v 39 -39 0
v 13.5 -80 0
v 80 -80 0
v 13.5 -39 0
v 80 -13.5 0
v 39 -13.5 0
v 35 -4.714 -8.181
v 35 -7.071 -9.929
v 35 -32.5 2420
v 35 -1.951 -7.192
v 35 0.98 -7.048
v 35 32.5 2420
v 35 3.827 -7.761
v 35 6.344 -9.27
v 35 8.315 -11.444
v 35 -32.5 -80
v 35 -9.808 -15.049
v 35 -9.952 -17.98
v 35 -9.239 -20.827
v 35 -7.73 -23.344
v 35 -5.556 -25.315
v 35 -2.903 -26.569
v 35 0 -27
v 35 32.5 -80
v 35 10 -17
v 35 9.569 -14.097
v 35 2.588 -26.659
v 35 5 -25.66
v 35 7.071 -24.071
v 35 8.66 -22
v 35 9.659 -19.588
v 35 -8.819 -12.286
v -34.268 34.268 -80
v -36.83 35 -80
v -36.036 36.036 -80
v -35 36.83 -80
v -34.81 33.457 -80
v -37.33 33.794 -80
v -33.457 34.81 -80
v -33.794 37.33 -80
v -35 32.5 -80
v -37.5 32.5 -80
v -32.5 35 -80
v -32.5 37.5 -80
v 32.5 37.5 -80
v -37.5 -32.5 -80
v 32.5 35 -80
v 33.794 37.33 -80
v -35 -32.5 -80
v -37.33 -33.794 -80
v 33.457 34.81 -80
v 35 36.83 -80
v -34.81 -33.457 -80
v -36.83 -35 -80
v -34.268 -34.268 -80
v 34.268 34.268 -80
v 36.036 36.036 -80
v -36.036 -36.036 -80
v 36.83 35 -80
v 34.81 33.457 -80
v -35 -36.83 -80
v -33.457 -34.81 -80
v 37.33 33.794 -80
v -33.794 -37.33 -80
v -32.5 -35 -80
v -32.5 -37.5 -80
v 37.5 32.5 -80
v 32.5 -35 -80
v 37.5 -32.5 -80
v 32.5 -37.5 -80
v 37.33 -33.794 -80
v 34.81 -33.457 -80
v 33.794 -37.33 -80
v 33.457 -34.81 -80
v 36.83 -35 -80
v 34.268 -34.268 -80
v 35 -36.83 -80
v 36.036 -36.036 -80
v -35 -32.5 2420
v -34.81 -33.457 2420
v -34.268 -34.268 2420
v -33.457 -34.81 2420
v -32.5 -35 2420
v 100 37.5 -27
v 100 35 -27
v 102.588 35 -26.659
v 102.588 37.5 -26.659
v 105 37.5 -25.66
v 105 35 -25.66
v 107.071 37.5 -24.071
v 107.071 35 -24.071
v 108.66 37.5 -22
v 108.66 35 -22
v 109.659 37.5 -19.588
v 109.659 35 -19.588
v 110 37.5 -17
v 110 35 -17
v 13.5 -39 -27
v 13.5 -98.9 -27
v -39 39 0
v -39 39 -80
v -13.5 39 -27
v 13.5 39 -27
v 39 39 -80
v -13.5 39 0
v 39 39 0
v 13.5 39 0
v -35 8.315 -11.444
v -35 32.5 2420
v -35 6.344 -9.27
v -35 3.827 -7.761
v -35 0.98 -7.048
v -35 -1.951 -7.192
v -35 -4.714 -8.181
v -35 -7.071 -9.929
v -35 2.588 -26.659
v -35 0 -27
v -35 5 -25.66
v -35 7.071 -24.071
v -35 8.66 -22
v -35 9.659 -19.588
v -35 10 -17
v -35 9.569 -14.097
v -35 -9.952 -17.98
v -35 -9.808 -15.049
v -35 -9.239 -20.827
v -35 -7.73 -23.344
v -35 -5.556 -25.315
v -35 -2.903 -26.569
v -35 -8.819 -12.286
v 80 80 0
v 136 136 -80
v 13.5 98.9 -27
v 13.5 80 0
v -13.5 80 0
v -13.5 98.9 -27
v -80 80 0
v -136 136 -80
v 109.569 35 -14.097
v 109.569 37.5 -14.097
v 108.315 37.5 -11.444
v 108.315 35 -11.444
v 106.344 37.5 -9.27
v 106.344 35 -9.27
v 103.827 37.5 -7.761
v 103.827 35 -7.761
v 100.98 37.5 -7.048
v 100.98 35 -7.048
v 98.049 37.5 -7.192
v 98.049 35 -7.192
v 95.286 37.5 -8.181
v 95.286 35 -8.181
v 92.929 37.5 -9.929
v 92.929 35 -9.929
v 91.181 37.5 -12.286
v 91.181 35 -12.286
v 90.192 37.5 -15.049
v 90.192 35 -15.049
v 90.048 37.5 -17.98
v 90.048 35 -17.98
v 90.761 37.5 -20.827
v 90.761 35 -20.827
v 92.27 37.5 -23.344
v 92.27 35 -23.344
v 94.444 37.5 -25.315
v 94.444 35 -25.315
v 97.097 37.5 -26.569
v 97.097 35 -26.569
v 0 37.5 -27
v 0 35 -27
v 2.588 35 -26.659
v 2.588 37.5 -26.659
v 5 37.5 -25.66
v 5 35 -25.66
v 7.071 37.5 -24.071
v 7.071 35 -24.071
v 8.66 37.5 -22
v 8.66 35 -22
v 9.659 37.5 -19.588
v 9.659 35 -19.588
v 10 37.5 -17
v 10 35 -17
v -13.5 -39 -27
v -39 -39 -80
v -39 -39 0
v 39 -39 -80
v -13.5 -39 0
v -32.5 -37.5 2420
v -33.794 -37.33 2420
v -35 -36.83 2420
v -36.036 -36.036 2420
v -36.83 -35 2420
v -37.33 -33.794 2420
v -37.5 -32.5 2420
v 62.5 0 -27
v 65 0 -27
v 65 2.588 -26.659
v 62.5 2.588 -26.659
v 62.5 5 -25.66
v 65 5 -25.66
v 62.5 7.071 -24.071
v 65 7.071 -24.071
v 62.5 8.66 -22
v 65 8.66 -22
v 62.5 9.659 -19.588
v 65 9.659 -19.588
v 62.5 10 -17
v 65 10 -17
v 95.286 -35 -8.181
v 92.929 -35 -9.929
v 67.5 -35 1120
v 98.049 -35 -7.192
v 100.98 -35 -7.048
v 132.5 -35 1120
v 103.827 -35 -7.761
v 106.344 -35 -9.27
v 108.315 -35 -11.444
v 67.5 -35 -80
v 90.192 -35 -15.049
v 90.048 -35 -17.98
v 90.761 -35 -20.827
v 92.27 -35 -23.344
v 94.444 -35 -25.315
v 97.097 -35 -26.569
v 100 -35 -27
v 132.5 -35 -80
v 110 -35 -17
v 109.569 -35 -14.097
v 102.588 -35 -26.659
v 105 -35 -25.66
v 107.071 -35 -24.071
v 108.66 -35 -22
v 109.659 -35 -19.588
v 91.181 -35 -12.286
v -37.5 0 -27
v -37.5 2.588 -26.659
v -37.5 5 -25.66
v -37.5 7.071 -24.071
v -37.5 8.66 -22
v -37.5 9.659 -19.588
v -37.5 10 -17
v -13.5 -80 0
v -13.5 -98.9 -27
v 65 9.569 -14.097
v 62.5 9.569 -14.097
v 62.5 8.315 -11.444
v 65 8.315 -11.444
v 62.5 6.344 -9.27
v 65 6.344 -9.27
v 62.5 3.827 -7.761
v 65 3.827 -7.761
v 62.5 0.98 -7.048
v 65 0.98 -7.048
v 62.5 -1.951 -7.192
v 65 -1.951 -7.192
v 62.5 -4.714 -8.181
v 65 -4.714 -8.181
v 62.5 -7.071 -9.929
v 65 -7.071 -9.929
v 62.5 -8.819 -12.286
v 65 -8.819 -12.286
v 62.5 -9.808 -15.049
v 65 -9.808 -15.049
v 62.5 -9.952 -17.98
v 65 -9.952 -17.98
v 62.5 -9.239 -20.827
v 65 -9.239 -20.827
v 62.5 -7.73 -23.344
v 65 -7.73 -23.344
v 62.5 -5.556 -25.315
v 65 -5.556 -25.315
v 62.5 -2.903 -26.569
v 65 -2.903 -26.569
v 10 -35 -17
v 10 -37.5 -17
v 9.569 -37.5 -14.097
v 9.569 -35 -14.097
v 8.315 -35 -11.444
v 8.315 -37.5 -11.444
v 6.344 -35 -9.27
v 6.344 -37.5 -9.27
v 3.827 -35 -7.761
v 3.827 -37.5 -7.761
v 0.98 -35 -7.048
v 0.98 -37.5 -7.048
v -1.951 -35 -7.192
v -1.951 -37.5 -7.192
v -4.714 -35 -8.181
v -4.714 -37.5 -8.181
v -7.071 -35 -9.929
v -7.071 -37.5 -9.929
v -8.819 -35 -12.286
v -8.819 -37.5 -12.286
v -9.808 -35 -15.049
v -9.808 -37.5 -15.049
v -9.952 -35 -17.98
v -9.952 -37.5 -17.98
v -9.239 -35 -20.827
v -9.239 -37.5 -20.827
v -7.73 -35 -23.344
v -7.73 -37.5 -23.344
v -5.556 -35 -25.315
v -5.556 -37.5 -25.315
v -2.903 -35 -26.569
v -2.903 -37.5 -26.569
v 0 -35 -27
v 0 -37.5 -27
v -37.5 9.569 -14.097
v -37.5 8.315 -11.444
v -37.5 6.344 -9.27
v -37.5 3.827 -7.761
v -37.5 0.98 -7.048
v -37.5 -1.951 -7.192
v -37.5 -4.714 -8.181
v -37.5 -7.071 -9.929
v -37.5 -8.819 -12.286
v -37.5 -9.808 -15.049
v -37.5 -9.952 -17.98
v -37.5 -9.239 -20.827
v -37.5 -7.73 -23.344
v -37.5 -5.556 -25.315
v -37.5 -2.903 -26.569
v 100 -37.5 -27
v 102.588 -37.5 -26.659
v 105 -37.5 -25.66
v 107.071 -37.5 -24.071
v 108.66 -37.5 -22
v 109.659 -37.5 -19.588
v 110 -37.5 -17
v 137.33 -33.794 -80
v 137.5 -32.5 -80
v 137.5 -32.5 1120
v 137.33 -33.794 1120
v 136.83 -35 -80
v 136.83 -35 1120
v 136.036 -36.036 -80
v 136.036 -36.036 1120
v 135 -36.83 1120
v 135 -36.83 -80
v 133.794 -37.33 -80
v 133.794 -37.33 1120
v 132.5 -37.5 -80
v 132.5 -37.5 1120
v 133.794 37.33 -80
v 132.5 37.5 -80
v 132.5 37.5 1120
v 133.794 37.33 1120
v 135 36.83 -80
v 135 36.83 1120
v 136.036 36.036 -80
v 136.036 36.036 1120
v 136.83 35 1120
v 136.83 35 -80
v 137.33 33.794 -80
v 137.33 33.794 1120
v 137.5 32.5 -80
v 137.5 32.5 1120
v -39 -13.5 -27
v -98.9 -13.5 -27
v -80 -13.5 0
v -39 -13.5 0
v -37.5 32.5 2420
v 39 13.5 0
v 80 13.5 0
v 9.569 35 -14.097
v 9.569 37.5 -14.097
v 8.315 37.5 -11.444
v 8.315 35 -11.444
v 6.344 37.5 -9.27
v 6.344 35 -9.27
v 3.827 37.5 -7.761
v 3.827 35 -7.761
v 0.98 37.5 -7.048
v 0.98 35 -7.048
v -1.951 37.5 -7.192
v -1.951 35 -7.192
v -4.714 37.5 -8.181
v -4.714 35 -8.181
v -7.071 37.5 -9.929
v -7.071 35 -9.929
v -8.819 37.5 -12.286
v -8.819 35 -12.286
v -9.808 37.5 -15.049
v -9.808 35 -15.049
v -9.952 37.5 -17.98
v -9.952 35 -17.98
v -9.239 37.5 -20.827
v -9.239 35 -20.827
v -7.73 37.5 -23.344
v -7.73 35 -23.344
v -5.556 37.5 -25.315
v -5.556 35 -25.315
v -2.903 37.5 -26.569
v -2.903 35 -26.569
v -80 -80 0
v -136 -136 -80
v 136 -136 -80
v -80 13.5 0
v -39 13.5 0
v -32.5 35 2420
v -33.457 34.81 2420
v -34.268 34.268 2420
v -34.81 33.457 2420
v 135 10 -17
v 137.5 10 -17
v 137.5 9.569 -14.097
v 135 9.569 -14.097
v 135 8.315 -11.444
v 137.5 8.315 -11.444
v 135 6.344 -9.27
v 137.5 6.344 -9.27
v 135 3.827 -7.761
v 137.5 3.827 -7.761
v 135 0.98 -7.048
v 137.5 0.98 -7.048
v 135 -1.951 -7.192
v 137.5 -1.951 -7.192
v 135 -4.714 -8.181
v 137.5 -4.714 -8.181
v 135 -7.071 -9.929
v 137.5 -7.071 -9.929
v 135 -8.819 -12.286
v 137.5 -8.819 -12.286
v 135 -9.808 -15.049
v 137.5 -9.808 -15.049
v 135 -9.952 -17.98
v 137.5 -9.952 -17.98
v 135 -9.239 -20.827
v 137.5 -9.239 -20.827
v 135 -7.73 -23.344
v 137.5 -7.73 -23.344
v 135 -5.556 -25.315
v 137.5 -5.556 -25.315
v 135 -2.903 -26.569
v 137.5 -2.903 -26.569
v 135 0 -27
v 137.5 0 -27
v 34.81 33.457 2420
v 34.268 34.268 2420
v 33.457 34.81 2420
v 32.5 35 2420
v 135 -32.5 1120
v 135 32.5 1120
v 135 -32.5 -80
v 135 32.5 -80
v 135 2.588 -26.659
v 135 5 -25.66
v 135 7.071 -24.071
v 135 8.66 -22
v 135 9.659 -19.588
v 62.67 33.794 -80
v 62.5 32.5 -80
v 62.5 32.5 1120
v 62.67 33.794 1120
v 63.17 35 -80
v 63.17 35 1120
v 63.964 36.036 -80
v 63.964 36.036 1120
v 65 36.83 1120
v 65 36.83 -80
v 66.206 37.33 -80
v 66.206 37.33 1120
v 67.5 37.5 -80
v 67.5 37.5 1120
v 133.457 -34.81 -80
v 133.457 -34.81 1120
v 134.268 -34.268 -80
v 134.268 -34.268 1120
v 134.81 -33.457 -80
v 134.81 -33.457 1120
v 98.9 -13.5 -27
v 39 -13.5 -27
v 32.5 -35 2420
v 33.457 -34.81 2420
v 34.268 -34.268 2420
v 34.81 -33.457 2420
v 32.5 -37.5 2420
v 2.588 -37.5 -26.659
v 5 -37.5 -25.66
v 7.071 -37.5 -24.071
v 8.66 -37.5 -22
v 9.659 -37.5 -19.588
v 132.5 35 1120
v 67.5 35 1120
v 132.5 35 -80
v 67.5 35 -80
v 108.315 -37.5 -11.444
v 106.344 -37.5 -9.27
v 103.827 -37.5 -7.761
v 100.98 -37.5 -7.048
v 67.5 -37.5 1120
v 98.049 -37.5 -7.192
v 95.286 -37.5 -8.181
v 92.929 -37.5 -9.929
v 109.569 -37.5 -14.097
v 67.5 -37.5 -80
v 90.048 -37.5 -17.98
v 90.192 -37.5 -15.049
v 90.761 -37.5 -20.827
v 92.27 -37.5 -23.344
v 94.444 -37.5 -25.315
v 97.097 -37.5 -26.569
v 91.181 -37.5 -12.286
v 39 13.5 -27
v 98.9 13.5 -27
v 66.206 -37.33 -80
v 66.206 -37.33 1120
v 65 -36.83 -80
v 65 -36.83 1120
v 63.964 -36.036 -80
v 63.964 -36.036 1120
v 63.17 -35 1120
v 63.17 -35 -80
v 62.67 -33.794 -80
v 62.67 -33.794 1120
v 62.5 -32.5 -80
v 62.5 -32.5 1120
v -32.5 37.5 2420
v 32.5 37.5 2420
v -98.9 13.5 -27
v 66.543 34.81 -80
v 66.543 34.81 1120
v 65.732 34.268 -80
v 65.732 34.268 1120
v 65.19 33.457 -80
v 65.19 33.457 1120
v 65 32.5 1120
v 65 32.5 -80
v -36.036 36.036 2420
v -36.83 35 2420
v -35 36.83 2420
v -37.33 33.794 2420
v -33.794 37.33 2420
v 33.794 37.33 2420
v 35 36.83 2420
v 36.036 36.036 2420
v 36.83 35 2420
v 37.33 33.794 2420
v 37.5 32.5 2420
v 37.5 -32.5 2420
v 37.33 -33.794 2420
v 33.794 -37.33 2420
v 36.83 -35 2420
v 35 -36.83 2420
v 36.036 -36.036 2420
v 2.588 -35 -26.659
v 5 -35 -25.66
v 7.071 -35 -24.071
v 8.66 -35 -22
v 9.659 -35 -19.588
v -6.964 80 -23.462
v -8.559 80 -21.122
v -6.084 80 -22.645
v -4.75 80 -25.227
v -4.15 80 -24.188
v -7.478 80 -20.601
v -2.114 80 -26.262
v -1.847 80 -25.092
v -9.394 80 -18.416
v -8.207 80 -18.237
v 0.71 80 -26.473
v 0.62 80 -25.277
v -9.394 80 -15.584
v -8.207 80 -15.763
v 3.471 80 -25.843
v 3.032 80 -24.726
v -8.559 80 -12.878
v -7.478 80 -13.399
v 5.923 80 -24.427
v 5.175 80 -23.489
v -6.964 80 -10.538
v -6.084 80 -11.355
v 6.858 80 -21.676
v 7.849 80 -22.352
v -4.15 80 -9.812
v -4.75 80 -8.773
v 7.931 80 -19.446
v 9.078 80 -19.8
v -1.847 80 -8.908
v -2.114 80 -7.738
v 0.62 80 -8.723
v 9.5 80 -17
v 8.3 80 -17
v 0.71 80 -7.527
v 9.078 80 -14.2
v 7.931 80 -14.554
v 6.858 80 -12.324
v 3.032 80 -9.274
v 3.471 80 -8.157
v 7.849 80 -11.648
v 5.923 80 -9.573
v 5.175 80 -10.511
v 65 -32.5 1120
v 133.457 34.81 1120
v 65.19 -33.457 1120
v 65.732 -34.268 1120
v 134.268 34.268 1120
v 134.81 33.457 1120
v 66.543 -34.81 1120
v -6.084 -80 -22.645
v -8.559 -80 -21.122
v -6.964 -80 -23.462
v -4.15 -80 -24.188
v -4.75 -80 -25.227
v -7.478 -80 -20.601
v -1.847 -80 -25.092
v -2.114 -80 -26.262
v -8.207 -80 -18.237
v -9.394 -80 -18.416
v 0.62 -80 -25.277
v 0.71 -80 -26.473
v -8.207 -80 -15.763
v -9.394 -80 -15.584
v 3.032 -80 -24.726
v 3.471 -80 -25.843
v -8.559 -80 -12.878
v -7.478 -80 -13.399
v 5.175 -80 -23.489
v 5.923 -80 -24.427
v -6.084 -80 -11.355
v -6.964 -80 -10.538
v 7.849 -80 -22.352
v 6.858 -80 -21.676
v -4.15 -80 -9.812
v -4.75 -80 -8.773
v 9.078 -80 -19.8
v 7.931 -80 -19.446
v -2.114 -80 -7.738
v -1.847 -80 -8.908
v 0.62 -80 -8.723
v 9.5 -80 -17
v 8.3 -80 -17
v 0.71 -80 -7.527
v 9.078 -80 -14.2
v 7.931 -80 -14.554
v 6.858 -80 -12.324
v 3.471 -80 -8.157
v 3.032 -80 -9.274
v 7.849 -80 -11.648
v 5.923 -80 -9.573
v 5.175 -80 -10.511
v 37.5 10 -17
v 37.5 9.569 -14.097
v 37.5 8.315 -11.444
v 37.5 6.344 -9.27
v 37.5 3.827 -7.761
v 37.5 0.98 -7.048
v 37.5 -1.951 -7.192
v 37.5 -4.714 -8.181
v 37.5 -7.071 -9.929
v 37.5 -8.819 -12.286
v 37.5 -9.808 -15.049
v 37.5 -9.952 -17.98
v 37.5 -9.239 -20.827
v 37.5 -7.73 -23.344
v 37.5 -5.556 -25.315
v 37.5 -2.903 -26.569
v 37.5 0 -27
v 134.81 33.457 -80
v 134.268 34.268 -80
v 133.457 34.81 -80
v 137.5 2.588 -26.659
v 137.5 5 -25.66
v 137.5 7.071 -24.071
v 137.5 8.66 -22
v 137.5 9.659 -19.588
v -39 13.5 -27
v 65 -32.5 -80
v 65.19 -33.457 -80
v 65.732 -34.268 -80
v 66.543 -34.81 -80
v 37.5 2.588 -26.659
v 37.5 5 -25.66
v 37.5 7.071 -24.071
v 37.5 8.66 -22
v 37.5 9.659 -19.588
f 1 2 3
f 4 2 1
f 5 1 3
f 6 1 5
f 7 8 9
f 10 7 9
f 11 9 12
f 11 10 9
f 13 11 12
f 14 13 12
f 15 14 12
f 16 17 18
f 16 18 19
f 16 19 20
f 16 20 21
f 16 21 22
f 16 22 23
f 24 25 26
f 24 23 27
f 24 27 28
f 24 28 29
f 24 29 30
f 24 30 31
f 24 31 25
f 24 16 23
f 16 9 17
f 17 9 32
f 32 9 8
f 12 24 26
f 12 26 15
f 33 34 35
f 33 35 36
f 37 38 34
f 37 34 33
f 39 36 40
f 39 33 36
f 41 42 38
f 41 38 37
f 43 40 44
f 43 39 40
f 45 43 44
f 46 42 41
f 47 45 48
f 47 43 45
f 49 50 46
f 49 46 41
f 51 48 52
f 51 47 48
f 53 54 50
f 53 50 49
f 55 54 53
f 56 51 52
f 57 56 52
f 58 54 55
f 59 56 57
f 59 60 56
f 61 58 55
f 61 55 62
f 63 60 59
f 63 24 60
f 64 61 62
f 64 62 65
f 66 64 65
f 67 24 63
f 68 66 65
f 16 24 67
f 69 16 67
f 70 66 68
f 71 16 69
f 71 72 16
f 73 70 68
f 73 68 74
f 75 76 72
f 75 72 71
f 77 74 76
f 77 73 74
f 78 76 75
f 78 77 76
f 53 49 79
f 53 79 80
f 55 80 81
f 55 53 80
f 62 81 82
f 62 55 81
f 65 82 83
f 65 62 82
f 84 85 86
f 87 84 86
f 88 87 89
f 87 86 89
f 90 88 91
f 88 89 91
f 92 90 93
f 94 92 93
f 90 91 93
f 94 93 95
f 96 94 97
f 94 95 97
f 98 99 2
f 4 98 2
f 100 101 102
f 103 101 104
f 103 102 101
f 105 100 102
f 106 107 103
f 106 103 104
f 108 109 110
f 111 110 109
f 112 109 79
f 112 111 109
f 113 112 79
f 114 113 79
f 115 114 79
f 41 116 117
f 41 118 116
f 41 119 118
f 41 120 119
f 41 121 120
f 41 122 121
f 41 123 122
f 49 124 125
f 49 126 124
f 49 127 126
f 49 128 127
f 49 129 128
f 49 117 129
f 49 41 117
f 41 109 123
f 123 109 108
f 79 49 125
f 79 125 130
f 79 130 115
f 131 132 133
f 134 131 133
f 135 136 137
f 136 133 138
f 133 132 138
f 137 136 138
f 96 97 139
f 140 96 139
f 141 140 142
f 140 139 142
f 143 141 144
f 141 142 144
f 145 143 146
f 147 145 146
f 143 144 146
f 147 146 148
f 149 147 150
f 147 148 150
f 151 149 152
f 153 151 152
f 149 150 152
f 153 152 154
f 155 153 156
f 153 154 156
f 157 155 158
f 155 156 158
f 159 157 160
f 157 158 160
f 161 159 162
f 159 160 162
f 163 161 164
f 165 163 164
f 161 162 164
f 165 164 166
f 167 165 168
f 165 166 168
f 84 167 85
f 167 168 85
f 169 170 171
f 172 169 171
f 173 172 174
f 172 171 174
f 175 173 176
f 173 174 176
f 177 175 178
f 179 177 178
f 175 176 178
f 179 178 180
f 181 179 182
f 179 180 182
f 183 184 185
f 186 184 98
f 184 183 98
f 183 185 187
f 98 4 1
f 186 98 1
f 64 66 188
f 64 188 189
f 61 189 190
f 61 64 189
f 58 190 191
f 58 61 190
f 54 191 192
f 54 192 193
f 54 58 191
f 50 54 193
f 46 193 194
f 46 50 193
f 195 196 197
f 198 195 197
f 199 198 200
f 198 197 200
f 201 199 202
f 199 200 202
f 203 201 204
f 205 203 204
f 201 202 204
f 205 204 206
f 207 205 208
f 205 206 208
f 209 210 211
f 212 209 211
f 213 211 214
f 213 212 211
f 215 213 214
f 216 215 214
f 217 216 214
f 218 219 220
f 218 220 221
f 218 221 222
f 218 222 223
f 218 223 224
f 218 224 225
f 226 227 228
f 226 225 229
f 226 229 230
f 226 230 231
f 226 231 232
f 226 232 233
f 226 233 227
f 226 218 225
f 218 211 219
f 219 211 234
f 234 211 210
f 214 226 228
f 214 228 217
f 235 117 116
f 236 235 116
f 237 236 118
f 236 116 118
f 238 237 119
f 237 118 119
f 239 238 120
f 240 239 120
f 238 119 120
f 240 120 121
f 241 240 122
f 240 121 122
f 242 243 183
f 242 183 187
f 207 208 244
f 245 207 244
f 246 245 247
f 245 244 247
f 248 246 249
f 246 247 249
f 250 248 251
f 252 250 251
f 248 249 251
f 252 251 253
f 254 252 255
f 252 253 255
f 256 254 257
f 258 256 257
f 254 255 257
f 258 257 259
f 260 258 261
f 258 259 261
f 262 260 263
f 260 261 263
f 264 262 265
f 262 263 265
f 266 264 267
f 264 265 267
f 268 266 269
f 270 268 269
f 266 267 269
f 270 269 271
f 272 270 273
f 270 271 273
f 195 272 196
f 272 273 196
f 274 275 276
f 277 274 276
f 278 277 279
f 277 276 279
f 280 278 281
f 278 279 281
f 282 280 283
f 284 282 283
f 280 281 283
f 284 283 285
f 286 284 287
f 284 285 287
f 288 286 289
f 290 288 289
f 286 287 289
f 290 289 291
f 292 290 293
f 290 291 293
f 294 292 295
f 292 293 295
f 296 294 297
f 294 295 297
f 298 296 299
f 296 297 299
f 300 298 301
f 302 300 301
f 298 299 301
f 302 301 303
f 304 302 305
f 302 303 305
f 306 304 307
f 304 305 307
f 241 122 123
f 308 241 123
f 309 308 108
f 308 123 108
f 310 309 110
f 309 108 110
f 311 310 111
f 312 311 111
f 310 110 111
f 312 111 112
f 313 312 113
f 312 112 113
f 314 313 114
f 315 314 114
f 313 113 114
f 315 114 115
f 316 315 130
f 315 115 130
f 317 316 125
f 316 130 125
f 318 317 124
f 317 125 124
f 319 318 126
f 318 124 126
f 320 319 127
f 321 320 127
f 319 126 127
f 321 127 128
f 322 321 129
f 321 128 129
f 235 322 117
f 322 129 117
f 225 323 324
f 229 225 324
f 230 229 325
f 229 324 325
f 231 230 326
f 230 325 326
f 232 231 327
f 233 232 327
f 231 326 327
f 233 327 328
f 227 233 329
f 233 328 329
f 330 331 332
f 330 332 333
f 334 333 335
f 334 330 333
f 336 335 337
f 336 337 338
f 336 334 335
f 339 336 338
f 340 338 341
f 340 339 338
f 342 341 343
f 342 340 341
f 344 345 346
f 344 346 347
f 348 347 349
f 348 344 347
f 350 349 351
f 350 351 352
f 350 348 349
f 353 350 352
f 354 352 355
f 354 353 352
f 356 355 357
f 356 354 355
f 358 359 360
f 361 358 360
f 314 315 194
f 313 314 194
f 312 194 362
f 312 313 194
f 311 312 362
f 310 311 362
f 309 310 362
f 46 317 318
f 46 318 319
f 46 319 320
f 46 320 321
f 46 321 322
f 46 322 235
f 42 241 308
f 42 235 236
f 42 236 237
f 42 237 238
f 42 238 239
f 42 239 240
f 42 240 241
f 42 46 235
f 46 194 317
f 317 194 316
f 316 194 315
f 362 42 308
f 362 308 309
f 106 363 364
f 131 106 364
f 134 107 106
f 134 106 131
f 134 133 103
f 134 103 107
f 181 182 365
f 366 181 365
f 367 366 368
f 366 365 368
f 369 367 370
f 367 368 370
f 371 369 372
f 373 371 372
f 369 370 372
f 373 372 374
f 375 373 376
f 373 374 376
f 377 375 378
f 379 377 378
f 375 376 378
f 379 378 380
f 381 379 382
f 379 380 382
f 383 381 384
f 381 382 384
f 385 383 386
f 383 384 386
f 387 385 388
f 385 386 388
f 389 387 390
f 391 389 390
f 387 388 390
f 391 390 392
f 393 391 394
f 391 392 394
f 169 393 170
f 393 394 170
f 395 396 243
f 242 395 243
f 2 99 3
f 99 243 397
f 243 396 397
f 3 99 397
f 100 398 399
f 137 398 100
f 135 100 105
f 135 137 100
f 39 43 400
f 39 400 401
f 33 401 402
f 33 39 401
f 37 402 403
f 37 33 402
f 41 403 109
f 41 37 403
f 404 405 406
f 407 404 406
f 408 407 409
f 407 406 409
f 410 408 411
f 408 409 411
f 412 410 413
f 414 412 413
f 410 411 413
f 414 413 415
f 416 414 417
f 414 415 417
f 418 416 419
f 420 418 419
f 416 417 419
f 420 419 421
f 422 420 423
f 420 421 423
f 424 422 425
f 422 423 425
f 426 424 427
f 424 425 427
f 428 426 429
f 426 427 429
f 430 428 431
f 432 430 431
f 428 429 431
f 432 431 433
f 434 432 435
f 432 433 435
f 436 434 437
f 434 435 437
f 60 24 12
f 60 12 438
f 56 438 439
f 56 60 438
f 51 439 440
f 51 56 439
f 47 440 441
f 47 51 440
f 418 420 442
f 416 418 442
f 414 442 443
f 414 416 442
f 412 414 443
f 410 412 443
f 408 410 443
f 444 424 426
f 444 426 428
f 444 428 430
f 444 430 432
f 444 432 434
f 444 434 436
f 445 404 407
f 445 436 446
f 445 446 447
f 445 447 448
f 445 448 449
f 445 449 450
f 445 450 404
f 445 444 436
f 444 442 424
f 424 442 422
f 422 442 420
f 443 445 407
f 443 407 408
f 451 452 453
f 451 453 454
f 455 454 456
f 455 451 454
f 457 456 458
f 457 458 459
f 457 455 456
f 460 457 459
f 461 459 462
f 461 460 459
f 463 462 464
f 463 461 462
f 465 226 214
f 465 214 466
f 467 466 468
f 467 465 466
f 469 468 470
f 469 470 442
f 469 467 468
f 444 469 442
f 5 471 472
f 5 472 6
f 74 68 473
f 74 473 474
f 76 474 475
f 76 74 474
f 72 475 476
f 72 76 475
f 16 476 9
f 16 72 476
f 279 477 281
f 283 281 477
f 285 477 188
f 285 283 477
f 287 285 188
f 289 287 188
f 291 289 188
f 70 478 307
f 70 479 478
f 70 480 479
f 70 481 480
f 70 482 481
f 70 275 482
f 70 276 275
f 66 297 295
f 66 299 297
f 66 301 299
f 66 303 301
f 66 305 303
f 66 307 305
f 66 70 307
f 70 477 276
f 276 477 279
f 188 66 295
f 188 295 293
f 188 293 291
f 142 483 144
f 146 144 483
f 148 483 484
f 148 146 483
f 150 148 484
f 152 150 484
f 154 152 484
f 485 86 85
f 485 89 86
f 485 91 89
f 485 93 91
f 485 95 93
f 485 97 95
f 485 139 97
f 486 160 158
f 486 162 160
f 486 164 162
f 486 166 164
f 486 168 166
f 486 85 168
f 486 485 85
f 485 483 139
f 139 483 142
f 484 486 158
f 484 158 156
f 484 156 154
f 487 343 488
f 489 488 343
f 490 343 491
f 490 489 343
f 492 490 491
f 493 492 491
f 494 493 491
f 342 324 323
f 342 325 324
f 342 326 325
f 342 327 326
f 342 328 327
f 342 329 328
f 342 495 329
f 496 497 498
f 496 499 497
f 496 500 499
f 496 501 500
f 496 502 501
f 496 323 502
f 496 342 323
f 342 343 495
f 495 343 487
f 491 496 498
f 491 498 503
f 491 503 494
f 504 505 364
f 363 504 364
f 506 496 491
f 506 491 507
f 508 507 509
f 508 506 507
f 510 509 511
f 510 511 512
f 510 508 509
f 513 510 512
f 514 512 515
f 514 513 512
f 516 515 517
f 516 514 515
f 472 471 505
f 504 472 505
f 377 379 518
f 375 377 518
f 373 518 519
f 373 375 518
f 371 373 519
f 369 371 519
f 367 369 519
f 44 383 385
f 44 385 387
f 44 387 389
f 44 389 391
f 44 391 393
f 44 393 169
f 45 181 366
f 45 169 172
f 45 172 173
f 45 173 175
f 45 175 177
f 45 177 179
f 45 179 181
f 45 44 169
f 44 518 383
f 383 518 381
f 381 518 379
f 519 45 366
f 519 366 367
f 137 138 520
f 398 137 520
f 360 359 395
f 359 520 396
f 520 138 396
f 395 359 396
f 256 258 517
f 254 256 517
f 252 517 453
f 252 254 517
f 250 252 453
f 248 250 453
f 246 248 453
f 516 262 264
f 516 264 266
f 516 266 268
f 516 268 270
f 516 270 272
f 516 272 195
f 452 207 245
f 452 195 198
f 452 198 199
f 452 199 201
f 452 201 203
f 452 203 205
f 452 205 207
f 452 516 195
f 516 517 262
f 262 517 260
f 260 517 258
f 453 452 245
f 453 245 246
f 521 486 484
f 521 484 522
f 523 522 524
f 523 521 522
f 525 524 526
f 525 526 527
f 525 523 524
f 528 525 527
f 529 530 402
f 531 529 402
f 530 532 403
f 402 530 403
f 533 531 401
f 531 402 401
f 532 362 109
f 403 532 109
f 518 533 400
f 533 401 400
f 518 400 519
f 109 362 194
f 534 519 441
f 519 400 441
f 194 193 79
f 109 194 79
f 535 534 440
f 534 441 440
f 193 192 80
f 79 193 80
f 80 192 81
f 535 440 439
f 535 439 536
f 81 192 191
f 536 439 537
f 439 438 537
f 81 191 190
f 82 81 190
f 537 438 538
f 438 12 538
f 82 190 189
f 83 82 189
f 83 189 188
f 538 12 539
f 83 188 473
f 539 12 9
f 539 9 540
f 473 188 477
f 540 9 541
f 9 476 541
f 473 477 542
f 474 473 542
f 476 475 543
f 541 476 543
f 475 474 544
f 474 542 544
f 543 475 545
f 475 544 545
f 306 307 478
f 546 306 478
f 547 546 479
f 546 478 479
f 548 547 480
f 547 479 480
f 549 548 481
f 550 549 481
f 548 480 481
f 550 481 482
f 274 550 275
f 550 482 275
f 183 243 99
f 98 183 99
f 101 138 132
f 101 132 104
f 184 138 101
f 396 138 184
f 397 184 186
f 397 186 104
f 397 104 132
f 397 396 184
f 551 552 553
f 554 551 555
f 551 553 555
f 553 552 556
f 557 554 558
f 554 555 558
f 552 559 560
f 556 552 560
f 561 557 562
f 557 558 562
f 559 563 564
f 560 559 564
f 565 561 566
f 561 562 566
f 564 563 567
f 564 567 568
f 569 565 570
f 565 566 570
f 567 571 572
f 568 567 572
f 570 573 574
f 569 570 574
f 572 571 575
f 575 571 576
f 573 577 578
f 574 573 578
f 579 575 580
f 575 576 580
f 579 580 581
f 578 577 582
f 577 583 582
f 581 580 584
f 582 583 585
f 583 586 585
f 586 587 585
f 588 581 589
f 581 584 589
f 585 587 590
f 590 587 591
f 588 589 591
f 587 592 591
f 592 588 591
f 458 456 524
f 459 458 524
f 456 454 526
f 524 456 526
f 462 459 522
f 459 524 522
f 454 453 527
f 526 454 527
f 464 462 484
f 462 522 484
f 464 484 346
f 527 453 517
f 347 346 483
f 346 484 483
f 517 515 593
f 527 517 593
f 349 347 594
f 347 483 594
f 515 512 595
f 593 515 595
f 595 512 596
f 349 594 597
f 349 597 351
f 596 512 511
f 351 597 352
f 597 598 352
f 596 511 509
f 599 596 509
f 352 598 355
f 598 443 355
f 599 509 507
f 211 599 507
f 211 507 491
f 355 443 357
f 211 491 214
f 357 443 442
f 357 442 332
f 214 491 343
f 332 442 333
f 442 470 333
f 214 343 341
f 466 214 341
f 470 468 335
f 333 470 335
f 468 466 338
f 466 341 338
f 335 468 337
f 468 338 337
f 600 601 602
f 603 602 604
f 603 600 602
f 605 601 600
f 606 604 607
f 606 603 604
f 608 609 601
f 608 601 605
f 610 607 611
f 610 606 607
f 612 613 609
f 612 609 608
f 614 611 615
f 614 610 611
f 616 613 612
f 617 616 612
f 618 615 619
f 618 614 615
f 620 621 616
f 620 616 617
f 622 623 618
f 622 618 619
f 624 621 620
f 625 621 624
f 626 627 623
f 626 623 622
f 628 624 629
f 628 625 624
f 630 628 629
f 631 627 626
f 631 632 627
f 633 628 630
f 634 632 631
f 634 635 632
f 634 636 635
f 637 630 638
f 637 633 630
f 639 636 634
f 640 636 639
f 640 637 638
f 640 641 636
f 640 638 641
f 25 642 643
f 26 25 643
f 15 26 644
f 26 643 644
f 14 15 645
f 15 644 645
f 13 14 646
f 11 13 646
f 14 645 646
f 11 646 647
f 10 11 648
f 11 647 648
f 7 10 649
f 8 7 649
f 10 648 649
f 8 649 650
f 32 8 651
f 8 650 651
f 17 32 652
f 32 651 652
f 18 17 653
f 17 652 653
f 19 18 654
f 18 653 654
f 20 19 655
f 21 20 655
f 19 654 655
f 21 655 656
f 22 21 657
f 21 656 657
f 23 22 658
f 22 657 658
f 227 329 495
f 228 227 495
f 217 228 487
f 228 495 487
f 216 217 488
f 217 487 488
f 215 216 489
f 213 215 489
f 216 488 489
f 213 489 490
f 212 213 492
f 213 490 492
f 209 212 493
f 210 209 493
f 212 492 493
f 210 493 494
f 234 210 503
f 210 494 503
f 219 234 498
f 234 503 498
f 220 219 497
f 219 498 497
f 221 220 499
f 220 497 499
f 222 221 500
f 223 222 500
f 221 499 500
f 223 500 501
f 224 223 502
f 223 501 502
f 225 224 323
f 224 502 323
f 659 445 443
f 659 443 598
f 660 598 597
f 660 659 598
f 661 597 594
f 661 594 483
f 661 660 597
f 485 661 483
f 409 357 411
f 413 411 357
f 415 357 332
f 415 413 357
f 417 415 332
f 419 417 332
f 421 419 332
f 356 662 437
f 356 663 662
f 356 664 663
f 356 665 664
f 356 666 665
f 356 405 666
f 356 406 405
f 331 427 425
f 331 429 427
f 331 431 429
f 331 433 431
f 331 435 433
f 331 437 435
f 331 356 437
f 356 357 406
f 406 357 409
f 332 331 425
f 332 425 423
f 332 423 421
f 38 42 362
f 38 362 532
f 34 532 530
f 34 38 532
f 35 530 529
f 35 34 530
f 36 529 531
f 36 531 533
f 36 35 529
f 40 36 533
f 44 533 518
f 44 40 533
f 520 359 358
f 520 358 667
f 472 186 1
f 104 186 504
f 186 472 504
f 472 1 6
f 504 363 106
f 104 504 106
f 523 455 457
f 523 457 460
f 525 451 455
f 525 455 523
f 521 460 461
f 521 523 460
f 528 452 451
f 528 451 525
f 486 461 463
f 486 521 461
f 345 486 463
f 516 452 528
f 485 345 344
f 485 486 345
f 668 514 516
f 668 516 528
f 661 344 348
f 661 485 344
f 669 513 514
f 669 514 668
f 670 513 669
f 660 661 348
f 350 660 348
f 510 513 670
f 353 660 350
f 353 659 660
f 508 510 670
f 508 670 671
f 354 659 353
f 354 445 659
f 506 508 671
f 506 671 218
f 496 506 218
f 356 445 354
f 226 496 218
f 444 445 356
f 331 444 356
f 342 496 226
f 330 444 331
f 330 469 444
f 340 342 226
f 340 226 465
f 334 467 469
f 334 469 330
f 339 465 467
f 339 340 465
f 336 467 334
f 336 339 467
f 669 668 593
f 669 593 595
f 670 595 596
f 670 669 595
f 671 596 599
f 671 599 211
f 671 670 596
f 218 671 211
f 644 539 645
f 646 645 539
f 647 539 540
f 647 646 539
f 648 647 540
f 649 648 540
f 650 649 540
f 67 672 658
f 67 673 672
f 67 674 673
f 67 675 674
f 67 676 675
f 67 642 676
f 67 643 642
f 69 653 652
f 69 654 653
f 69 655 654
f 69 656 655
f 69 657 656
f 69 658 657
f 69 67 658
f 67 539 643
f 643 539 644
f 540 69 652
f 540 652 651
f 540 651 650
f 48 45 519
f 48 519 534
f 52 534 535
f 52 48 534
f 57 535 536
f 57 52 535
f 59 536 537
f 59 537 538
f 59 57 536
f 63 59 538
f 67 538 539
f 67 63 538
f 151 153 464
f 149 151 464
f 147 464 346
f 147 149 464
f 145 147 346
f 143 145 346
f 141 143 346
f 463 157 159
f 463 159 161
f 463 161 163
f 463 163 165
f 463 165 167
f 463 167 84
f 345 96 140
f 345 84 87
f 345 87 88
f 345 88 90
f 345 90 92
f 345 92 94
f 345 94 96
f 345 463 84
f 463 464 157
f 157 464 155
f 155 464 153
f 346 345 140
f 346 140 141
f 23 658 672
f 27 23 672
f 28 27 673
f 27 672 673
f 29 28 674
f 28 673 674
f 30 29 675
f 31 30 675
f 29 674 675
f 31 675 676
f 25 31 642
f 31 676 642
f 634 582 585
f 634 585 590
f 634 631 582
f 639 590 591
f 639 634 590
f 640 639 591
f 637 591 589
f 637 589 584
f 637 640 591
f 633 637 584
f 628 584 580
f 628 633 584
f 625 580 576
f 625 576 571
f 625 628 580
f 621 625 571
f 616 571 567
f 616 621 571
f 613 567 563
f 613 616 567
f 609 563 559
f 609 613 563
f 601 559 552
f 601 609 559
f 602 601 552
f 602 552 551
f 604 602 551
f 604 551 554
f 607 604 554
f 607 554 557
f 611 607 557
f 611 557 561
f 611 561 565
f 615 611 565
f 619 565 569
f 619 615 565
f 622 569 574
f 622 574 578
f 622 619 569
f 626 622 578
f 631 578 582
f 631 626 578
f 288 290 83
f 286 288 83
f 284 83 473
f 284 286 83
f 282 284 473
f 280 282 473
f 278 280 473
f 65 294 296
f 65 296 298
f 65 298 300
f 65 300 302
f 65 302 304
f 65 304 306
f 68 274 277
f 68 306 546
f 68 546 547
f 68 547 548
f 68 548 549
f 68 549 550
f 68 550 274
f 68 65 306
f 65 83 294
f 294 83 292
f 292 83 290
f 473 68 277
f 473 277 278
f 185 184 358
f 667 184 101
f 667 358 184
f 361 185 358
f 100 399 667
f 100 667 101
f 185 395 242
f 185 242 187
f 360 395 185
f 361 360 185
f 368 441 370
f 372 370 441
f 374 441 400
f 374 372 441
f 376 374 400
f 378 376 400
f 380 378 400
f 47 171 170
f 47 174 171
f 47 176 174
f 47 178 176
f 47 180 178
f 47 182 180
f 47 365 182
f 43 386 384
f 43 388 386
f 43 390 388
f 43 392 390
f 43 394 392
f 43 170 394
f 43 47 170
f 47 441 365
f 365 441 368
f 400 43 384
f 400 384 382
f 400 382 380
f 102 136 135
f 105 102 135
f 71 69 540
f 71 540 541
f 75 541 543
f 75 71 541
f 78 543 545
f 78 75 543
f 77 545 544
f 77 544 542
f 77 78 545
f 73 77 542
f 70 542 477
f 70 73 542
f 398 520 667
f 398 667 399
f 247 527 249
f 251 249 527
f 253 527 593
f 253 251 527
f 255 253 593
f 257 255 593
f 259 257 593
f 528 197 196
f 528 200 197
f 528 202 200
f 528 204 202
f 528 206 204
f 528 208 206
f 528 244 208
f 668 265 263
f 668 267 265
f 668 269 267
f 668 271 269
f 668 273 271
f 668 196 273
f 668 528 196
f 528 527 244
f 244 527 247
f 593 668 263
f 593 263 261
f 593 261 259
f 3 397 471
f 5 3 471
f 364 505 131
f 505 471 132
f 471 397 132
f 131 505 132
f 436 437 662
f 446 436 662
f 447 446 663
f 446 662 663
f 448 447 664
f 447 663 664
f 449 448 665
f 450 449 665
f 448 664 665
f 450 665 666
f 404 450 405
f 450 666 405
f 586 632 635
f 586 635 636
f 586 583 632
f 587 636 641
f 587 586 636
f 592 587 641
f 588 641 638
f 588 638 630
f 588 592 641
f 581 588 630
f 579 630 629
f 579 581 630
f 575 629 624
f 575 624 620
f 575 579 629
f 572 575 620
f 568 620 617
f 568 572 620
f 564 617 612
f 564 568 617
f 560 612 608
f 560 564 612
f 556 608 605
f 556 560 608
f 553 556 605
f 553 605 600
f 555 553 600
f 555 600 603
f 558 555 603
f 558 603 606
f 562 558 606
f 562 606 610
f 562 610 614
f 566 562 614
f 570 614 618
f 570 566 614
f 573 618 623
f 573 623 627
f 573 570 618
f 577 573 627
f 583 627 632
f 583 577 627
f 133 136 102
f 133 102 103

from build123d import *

# Parameters (mm, degrees)
F0_W      = 160
F0_H      = 160
F3_W      = 272
F3_H      = 272
F5_W      = 78
F5_H      = 78
F6_DEPTH  = 80.0010001
F7_W      = 27
F7_H      = 54
F8_DEPTH  = 119.1
F9_W      = 27
F9_H      = 54
F10_DEPTH = 400
F12_DEPTH = 2500
F14_DEPTH = 173.5010001
F16_DEPTH = 173.5010001
F17_R     = 9.5
F17_R_2   = 8.3
F18_DEPTH = 80
F20_DEPTH = 1300


with BuildPart() as f4:
    # F0 (on Top) → F4 section 0
    with BuildSketch(Plane.XY):
        Rectangle(F0_W, F0_H)
    # F3 (on line) → F4 section 1
    with BuildSketch(Plane(origin=(0, 0, -80), x_dir=(1, 0, 0), z_dir=(0, 0, -1))):
        Rectangle(F3_W, F3_H)
    loft()

    # F5 (on face) → F6 (cut, through all)
    with BuildSketch(Plane.XY):
        Rectangle(F5_W, F5_H)
    extrude(amount=-F6_DEPTH, mode=Mode.SUBTRACT)

    # F7 (on Front) → F8 (cut, symmetric)
    with BuildSketch(Plane.XZ):
        Rectangle(F7_W, F7_H)
    extrude(amount=F8_DEPTH, both=True, mode=Mode.SUBTRACT)

    # F9 (on Right) → F10 (cut, symmetric)
    with BuildSketch(Plane.YZ):
        Rectangle(F9_W, F9_H)
    extrude(amount=F10_DEPTH, both=True, mode=Mode.SUBTRACT)


with BuildPart() as f12:
    # F11 (on line) → F12 (new body)
    with BuildSketch(Plane(origin=(0, 0, -80), x_dir=(1, 0, 0), z_dir=(0, 0, -1))):
        with BuildLine():
            Line((32.5, 37.5), (-32.5, 37.5))
            ThreePointArc((-32.5, 37.5), (-36.0355339059, 36.0355339059), (-37.5, 32.5))
            Line((-37.5, 32.5), (-37.5, -32.5))
            ThreePointArc((-37.5, -32.5), (-36.0355339059, -36.0355339059), (-32.5, -37.5))
            Line((-32.5, -37.5), (32.5, -37.5))
            ThreePointArc((32.5, -37.5), (36.0355339059, -36.0355339059), (37.5, -32.5))
            Line((37.5, -32.5), (37.5, 32.5))
            ThreePointArc((37.5, 32.5), (36.0355339059, 36.0355339059), (32.5, 37.5))
        make_face()
        with BuildLine():
            ThreePointArc((-35, 32.5), (-34.267766953, 34.267766953), (-32.5, 35))
            Line((-32.5, 35), (32.5, 35))
            ThreePointArc((32.5, 35), (34.267766953, 34.267766953), (35, 32.5))
            Line((35, 32.5), (35, -32.5))
            ThreePointArc((35, -32.5), (34.267766953, -34.267766953), (32.5, -35))
            Line((32.5, -35), (-32.5, -35))
            ThreePointArc((-32.5, -35), (-34.267766953, -34.267766953), (-35, -32.5))
            Line((-35, -32.5), (-35, 32.5))
        make_face(mode=Mode.SUBTRACT)
    extrude(amount=-F12_DEPTH)

    # F13 (on face) → F14 (cut, through all)
    with BuildSketch(Plane.XZ.offset(37.5)):
        with BuildLine():
            ThreePointArc((0, -27), (7.0710678119, -24.0710678119), (10, -17))
            ThreePointArc((10, -17), (-7.0710678119, -9.9289321881), (0, -27))
        make_face()
    extrude(amount=-F14_DEPTH, mode=Mode.SUBTRACT)

    # F15 (on face) → F16 (cut, through all)
    with BuildSketch(Plane.YZ.offset(37.5)):
        with BuildLine():
            ThreePointArc((0, -27), (7.0710678119, -24.0710678119), (10, -17))
            ThreePointArc((10, -17), (-7.0710678119, -9.9289321881), (0, -27))
        make_face()
    extrude(amount=-F16_DEPTH, mode=Mode.SUBTRACT)


with BuildPart() as f18:
    # F17 (on Front) → F18 (new body, symmetric)
    with BuildSketch(Plane.XZ):
        with Locations((0, -17)):
            Circle(F17_R)
        with Locations((0, -17)):
            Circle(F17_R_2, mode=Mode.SUBTRACT)
    extrude(amount=F18_DEPTH, both=True)


with BuildPart() as f19_1:
    # F19: copy of F12
    add(f12.part.moved(Location((100, 0, 0))))

    # F20 (cut): a face of the model
    f20_faces = [f19_1.faces().sort_by_distance(p)[0] for p in [
        (100, -36.4393398282, 2420),
    ]]
    extrude(f20_faces, amount=-F20_DEPTH, mode=Mode.SUBTRACT)


solid = Compound([f4.part, f12.part, f18.part, f19_1.part])
